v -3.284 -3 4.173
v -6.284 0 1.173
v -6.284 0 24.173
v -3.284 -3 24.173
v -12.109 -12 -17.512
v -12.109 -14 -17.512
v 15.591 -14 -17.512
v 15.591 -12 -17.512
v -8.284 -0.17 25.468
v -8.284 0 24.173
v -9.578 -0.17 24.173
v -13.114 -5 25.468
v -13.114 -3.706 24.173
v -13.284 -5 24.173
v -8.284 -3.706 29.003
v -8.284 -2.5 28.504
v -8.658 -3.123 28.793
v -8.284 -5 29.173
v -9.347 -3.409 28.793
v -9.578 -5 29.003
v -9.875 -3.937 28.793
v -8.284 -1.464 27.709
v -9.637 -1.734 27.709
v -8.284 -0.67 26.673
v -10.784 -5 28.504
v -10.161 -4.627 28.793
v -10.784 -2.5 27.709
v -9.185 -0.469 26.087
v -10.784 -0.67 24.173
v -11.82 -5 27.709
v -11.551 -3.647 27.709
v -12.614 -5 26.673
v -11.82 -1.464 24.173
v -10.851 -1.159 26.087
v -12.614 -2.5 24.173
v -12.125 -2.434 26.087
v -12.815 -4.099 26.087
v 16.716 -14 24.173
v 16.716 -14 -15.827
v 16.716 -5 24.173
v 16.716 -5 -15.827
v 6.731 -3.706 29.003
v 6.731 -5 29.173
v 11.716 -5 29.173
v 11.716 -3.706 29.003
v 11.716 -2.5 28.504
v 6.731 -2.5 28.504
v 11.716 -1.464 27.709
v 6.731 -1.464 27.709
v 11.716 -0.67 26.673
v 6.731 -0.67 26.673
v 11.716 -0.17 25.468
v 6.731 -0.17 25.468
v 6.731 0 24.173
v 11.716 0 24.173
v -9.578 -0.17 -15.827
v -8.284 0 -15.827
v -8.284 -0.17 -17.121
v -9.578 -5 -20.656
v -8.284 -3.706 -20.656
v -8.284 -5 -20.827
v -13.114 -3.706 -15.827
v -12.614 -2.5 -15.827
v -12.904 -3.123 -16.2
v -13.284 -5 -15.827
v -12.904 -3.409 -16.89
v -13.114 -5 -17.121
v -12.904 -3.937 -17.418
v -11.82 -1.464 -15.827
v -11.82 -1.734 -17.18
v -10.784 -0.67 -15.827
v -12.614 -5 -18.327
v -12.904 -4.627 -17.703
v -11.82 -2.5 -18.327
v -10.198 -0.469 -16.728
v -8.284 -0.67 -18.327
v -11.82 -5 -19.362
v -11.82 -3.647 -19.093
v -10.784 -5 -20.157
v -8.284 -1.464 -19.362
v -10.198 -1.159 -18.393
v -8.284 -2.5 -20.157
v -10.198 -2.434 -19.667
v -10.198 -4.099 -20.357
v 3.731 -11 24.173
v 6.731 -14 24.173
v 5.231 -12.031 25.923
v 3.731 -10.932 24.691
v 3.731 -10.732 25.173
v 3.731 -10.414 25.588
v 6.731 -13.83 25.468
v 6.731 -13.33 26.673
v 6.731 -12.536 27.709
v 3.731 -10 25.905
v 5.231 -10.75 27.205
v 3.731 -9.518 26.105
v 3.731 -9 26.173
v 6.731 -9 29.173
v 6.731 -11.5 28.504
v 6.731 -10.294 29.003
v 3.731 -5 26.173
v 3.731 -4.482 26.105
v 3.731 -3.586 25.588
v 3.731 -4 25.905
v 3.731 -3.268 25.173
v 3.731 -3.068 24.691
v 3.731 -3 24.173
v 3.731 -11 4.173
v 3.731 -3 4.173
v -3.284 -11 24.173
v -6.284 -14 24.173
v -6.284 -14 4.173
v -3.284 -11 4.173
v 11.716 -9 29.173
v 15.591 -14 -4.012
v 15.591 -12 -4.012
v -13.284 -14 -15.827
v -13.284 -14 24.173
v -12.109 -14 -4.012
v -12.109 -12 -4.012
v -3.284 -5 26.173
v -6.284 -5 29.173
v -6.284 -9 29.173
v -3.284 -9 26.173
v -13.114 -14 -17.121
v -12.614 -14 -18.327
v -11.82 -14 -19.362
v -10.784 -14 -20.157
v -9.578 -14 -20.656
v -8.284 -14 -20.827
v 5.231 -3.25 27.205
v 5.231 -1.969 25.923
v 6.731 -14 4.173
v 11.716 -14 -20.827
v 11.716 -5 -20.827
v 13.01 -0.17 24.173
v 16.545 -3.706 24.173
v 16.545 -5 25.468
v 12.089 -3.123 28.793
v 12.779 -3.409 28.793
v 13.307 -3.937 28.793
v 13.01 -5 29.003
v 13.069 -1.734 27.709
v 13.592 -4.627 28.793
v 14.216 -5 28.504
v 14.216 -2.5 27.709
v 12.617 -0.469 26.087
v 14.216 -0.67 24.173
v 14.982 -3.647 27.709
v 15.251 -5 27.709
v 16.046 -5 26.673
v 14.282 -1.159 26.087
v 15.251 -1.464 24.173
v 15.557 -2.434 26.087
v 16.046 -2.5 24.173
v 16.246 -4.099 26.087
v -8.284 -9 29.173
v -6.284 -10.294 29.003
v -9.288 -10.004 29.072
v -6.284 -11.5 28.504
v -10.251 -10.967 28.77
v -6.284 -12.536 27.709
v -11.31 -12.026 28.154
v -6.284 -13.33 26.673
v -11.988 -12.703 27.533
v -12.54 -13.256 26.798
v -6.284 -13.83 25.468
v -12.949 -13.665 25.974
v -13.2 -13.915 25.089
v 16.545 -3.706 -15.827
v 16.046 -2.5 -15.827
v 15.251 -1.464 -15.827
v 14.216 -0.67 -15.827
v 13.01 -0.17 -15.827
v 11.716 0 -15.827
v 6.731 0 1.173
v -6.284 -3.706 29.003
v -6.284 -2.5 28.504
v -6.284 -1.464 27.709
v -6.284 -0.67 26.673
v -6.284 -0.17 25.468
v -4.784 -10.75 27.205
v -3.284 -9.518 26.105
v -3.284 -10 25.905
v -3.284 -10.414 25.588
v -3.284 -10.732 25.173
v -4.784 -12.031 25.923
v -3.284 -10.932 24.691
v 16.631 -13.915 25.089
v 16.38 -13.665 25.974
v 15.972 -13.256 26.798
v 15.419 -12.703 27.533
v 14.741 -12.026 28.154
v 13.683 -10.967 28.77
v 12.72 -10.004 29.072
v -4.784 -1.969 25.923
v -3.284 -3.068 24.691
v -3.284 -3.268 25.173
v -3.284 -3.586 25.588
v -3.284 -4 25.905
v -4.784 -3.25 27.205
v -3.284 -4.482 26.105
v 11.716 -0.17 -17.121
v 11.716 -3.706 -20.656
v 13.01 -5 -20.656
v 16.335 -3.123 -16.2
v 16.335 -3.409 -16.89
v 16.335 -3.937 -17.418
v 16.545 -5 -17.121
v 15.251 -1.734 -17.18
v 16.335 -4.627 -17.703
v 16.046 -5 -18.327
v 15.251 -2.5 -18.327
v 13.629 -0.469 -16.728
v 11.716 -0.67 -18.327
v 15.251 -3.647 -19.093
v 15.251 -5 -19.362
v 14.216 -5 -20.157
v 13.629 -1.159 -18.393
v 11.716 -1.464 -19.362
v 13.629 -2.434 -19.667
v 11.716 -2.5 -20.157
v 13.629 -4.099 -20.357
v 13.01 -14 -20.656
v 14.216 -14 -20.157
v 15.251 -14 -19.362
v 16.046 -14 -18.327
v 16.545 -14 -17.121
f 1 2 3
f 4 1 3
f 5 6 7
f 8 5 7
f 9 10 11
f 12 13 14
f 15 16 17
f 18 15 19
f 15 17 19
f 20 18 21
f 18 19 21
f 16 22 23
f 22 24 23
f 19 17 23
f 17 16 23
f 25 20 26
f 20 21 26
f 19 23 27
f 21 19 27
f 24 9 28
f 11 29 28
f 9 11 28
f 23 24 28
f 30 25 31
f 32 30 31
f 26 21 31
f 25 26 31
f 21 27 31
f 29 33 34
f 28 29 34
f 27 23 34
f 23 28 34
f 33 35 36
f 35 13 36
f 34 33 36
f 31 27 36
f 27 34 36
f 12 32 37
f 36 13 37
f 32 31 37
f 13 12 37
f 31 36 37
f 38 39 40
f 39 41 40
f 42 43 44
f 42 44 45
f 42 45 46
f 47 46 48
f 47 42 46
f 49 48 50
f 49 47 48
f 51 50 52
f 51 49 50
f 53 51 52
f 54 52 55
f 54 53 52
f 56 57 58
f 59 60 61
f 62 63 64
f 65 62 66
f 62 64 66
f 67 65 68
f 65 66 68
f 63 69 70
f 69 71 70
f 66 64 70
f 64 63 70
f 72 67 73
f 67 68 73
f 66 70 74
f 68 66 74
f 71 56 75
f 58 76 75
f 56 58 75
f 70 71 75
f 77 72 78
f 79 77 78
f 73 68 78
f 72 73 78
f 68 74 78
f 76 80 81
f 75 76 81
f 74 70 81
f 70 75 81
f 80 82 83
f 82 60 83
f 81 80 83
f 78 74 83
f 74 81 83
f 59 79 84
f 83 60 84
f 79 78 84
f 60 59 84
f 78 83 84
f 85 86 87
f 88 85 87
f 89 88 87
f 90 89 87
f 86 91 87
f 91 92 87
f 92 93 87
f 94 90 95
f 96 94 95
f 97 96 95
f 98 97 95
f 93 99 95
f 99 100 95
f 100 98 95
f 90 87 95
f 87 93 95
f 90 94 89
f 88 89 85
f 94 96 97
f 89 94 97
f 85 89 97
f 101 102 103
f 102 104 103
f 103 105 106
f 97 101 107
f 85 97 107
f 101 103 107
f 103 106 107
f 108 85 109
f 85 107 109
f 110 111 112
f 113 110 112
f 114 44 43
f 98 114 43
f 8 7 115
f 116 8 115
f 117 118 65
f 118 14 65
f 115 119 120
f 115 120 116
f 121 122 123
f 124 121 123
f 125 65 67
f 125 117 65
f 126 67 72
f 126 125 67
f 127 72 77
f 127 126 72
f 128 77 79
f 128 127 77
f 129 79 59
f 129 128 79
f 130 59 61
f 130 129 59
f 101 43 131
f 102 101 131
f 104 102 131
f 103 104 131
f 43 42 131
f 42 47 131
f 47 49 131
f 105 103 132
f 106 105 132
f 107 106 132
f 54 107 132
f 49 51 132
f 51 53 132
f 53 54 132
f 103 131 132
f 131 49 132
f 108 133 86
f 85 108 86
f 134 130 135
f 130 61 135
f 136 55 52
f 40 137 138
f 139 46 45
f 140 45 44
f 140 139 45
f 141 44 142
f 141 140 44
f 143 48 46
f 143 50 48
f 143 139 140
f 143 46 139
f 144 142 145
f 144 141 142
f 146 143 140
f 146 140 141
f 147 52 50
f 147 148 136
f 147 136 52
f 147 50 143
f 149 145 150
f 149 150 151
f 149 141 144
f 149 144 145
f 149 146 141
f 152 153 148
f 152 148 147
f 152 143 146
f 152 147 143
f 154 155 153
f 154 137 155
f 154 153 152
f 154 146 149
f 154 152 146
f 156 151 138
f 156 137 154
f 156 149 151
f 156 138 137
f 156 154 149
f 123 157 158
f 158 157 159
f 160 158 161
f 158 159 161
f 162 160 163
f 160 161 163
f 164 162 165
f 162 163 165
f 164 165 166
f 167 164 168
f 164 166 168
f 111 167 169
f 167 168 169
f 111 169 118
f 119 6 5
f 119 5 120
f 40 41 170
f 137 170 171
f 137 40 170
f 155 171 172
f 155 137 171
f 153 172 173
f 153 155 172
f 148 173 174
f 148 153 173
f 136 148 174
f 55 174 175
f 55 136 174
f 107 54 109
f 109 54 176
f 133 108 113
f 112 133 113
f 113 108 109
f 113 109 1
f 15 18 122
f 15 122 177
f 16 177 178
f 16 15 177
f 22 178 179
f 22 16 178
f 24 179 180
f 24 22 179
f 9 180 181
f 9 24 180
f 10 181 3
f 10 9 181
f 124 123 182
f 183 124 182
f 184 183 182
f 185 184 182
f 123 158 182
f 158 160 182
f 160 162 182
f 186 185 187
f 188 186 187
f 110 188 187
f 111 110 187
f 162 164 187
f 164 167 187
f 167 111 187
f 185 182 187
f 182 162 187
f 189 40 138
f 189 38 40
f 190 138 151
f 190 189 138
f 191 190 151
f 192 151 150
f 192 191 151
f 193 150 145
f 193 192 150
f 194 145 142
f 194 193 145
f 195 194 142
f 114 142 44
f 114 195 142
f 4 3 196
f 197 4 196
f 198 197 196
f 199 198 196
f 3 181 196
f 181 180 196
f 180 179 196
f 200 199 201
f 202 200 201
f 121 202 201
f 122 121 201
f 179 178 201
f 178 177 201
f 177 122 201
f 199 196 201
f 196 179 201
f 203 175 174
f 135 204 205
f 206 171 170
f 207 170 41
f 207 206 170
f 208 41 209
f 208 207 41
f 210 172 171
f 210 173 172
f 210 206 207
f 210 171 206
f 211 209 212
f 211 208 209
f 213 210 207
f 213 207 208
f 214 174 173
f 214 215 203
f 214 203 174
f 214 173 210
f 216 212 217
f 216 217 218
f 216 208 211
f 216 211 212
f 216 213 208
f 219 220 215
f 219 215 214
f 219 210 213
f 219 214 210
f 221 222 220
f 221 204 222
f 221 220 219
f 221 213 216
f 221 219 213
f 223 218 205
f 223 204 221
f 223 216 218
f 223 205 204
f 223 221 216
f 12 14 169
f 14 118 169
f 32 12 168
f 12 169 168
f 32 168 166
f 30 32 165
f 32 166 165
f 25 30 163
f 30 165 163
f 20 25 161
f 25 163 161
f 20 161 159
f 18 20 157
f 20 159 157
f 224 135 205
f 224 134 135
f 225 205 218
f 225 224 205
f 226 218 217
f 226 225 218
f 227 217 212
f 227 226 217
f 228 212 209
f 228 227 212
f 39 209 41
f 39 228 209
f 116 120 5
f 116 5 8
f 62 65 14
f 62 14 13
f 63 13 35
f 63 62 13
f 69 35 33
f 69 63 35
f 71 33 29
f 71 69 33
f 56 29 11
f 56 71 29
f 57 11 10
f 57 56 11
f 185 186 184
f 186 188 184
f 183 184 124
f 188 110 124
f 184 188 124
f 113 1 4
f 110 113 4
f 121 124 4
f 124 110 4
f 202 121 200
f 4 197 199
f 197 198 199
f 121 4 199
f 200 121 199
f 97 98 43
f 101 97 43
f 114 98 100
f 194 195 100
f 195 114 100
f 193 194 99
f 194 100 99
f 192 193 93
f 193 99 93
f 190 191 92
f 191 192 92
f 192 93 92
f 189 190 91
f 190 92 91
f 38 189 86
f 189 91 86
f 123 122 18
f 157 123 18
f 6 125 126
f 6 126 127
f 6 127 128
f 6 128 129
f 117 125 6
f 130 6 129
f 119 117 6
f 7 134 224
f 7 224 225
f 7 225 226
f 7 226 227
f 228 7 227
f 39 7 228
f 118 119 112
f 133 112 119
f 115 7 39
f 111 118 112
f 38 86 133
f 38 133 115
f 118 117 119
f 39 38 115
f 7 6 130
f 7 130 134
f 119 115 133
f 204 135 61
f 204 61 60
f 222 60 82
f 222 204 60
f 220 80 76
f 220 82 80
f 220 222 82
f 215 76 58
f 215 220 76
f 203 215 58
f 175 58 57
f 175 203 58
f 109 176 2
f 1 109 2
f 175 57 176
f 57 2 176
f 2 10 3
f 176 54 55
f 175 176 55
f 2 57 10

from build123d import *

# Parameters (mm, degrees)
F0_W     = 27.7
F0_H     = 13.5
F1_DEPTH = 14
F2_R     = 5
F4_W     = 27.7
F4_H     = 13.5
F5_DEPTH = 2
F6_SIZE  = 3


with BuildPart() as f1:
    # F0 (on Front) → F1 (new body)
    with BuildSketch(Plane.XZ):
        Polygon((-13.2842407189, 29.1734449556), (-13.2842407189, -20.8265550444), (16.7157592811, -20.8265550444), (16.7157592811, 29.1734449556), (3.7307592811, 29.1734449556), (3.7307592811, 4.1734449556), (-3.2842407189, 4.1734449556), (-3.2842407189, 29.1734449556), align=None)
        with Locations((1.7157592811, -10.8674009684)):
            Rectangle(F0_W, F0_H, mode=Mode.SUBTRACT)
        with Locations((1.7157592811, -10.8674009684)):
            Rectangle(F0_W, F0_H)
    extrude(amount=F1_DEPTH)

    # F2
    f2_edges = [f1.edges().sort_by_distance(p)[0] for p in [
        (1.715759, 0, -20.826555),
        (-13.284241, 0, 4.173445),
        (16.715759, 0, 4.173445),
        (16.715759, -7, -20.826555),
        (-13.284241, -7, -20.826555),
        (-8.284241, 0, 29.173445),
        (10.223259, 0, 29.173445),
        (-13.284241, -7, 29.173445),
        (16.715759, -7, 29.173445),
        (10.223259, -14, 29.173445),
        (-8.284241, -14, 29.173445),
    ]]
    fillet(f2_edges, radius=F2_R)

    # F4 (on face) → F5 (cut)
    with BuildSketch(Plane.XZ.offset(14)):
        with Locations((1.7414525137, -10.761866346)):
            Rectangle(F4_W, F4_H)
    extrude(amount=-F5_DEPTH, mode=Mode.SUBTRACT)

    # F6
    f6_edges = [f1.edges().sort_by_distance(p)[0] for p in [
        (-3.284241, 0, 14.173445),
        (3.730759, 0, 14.173445),
        (0.223259, 0, 4.173445),
    ]]
    chamfer(f6_edges, length=F6_SIZE)


solid = f1.part
